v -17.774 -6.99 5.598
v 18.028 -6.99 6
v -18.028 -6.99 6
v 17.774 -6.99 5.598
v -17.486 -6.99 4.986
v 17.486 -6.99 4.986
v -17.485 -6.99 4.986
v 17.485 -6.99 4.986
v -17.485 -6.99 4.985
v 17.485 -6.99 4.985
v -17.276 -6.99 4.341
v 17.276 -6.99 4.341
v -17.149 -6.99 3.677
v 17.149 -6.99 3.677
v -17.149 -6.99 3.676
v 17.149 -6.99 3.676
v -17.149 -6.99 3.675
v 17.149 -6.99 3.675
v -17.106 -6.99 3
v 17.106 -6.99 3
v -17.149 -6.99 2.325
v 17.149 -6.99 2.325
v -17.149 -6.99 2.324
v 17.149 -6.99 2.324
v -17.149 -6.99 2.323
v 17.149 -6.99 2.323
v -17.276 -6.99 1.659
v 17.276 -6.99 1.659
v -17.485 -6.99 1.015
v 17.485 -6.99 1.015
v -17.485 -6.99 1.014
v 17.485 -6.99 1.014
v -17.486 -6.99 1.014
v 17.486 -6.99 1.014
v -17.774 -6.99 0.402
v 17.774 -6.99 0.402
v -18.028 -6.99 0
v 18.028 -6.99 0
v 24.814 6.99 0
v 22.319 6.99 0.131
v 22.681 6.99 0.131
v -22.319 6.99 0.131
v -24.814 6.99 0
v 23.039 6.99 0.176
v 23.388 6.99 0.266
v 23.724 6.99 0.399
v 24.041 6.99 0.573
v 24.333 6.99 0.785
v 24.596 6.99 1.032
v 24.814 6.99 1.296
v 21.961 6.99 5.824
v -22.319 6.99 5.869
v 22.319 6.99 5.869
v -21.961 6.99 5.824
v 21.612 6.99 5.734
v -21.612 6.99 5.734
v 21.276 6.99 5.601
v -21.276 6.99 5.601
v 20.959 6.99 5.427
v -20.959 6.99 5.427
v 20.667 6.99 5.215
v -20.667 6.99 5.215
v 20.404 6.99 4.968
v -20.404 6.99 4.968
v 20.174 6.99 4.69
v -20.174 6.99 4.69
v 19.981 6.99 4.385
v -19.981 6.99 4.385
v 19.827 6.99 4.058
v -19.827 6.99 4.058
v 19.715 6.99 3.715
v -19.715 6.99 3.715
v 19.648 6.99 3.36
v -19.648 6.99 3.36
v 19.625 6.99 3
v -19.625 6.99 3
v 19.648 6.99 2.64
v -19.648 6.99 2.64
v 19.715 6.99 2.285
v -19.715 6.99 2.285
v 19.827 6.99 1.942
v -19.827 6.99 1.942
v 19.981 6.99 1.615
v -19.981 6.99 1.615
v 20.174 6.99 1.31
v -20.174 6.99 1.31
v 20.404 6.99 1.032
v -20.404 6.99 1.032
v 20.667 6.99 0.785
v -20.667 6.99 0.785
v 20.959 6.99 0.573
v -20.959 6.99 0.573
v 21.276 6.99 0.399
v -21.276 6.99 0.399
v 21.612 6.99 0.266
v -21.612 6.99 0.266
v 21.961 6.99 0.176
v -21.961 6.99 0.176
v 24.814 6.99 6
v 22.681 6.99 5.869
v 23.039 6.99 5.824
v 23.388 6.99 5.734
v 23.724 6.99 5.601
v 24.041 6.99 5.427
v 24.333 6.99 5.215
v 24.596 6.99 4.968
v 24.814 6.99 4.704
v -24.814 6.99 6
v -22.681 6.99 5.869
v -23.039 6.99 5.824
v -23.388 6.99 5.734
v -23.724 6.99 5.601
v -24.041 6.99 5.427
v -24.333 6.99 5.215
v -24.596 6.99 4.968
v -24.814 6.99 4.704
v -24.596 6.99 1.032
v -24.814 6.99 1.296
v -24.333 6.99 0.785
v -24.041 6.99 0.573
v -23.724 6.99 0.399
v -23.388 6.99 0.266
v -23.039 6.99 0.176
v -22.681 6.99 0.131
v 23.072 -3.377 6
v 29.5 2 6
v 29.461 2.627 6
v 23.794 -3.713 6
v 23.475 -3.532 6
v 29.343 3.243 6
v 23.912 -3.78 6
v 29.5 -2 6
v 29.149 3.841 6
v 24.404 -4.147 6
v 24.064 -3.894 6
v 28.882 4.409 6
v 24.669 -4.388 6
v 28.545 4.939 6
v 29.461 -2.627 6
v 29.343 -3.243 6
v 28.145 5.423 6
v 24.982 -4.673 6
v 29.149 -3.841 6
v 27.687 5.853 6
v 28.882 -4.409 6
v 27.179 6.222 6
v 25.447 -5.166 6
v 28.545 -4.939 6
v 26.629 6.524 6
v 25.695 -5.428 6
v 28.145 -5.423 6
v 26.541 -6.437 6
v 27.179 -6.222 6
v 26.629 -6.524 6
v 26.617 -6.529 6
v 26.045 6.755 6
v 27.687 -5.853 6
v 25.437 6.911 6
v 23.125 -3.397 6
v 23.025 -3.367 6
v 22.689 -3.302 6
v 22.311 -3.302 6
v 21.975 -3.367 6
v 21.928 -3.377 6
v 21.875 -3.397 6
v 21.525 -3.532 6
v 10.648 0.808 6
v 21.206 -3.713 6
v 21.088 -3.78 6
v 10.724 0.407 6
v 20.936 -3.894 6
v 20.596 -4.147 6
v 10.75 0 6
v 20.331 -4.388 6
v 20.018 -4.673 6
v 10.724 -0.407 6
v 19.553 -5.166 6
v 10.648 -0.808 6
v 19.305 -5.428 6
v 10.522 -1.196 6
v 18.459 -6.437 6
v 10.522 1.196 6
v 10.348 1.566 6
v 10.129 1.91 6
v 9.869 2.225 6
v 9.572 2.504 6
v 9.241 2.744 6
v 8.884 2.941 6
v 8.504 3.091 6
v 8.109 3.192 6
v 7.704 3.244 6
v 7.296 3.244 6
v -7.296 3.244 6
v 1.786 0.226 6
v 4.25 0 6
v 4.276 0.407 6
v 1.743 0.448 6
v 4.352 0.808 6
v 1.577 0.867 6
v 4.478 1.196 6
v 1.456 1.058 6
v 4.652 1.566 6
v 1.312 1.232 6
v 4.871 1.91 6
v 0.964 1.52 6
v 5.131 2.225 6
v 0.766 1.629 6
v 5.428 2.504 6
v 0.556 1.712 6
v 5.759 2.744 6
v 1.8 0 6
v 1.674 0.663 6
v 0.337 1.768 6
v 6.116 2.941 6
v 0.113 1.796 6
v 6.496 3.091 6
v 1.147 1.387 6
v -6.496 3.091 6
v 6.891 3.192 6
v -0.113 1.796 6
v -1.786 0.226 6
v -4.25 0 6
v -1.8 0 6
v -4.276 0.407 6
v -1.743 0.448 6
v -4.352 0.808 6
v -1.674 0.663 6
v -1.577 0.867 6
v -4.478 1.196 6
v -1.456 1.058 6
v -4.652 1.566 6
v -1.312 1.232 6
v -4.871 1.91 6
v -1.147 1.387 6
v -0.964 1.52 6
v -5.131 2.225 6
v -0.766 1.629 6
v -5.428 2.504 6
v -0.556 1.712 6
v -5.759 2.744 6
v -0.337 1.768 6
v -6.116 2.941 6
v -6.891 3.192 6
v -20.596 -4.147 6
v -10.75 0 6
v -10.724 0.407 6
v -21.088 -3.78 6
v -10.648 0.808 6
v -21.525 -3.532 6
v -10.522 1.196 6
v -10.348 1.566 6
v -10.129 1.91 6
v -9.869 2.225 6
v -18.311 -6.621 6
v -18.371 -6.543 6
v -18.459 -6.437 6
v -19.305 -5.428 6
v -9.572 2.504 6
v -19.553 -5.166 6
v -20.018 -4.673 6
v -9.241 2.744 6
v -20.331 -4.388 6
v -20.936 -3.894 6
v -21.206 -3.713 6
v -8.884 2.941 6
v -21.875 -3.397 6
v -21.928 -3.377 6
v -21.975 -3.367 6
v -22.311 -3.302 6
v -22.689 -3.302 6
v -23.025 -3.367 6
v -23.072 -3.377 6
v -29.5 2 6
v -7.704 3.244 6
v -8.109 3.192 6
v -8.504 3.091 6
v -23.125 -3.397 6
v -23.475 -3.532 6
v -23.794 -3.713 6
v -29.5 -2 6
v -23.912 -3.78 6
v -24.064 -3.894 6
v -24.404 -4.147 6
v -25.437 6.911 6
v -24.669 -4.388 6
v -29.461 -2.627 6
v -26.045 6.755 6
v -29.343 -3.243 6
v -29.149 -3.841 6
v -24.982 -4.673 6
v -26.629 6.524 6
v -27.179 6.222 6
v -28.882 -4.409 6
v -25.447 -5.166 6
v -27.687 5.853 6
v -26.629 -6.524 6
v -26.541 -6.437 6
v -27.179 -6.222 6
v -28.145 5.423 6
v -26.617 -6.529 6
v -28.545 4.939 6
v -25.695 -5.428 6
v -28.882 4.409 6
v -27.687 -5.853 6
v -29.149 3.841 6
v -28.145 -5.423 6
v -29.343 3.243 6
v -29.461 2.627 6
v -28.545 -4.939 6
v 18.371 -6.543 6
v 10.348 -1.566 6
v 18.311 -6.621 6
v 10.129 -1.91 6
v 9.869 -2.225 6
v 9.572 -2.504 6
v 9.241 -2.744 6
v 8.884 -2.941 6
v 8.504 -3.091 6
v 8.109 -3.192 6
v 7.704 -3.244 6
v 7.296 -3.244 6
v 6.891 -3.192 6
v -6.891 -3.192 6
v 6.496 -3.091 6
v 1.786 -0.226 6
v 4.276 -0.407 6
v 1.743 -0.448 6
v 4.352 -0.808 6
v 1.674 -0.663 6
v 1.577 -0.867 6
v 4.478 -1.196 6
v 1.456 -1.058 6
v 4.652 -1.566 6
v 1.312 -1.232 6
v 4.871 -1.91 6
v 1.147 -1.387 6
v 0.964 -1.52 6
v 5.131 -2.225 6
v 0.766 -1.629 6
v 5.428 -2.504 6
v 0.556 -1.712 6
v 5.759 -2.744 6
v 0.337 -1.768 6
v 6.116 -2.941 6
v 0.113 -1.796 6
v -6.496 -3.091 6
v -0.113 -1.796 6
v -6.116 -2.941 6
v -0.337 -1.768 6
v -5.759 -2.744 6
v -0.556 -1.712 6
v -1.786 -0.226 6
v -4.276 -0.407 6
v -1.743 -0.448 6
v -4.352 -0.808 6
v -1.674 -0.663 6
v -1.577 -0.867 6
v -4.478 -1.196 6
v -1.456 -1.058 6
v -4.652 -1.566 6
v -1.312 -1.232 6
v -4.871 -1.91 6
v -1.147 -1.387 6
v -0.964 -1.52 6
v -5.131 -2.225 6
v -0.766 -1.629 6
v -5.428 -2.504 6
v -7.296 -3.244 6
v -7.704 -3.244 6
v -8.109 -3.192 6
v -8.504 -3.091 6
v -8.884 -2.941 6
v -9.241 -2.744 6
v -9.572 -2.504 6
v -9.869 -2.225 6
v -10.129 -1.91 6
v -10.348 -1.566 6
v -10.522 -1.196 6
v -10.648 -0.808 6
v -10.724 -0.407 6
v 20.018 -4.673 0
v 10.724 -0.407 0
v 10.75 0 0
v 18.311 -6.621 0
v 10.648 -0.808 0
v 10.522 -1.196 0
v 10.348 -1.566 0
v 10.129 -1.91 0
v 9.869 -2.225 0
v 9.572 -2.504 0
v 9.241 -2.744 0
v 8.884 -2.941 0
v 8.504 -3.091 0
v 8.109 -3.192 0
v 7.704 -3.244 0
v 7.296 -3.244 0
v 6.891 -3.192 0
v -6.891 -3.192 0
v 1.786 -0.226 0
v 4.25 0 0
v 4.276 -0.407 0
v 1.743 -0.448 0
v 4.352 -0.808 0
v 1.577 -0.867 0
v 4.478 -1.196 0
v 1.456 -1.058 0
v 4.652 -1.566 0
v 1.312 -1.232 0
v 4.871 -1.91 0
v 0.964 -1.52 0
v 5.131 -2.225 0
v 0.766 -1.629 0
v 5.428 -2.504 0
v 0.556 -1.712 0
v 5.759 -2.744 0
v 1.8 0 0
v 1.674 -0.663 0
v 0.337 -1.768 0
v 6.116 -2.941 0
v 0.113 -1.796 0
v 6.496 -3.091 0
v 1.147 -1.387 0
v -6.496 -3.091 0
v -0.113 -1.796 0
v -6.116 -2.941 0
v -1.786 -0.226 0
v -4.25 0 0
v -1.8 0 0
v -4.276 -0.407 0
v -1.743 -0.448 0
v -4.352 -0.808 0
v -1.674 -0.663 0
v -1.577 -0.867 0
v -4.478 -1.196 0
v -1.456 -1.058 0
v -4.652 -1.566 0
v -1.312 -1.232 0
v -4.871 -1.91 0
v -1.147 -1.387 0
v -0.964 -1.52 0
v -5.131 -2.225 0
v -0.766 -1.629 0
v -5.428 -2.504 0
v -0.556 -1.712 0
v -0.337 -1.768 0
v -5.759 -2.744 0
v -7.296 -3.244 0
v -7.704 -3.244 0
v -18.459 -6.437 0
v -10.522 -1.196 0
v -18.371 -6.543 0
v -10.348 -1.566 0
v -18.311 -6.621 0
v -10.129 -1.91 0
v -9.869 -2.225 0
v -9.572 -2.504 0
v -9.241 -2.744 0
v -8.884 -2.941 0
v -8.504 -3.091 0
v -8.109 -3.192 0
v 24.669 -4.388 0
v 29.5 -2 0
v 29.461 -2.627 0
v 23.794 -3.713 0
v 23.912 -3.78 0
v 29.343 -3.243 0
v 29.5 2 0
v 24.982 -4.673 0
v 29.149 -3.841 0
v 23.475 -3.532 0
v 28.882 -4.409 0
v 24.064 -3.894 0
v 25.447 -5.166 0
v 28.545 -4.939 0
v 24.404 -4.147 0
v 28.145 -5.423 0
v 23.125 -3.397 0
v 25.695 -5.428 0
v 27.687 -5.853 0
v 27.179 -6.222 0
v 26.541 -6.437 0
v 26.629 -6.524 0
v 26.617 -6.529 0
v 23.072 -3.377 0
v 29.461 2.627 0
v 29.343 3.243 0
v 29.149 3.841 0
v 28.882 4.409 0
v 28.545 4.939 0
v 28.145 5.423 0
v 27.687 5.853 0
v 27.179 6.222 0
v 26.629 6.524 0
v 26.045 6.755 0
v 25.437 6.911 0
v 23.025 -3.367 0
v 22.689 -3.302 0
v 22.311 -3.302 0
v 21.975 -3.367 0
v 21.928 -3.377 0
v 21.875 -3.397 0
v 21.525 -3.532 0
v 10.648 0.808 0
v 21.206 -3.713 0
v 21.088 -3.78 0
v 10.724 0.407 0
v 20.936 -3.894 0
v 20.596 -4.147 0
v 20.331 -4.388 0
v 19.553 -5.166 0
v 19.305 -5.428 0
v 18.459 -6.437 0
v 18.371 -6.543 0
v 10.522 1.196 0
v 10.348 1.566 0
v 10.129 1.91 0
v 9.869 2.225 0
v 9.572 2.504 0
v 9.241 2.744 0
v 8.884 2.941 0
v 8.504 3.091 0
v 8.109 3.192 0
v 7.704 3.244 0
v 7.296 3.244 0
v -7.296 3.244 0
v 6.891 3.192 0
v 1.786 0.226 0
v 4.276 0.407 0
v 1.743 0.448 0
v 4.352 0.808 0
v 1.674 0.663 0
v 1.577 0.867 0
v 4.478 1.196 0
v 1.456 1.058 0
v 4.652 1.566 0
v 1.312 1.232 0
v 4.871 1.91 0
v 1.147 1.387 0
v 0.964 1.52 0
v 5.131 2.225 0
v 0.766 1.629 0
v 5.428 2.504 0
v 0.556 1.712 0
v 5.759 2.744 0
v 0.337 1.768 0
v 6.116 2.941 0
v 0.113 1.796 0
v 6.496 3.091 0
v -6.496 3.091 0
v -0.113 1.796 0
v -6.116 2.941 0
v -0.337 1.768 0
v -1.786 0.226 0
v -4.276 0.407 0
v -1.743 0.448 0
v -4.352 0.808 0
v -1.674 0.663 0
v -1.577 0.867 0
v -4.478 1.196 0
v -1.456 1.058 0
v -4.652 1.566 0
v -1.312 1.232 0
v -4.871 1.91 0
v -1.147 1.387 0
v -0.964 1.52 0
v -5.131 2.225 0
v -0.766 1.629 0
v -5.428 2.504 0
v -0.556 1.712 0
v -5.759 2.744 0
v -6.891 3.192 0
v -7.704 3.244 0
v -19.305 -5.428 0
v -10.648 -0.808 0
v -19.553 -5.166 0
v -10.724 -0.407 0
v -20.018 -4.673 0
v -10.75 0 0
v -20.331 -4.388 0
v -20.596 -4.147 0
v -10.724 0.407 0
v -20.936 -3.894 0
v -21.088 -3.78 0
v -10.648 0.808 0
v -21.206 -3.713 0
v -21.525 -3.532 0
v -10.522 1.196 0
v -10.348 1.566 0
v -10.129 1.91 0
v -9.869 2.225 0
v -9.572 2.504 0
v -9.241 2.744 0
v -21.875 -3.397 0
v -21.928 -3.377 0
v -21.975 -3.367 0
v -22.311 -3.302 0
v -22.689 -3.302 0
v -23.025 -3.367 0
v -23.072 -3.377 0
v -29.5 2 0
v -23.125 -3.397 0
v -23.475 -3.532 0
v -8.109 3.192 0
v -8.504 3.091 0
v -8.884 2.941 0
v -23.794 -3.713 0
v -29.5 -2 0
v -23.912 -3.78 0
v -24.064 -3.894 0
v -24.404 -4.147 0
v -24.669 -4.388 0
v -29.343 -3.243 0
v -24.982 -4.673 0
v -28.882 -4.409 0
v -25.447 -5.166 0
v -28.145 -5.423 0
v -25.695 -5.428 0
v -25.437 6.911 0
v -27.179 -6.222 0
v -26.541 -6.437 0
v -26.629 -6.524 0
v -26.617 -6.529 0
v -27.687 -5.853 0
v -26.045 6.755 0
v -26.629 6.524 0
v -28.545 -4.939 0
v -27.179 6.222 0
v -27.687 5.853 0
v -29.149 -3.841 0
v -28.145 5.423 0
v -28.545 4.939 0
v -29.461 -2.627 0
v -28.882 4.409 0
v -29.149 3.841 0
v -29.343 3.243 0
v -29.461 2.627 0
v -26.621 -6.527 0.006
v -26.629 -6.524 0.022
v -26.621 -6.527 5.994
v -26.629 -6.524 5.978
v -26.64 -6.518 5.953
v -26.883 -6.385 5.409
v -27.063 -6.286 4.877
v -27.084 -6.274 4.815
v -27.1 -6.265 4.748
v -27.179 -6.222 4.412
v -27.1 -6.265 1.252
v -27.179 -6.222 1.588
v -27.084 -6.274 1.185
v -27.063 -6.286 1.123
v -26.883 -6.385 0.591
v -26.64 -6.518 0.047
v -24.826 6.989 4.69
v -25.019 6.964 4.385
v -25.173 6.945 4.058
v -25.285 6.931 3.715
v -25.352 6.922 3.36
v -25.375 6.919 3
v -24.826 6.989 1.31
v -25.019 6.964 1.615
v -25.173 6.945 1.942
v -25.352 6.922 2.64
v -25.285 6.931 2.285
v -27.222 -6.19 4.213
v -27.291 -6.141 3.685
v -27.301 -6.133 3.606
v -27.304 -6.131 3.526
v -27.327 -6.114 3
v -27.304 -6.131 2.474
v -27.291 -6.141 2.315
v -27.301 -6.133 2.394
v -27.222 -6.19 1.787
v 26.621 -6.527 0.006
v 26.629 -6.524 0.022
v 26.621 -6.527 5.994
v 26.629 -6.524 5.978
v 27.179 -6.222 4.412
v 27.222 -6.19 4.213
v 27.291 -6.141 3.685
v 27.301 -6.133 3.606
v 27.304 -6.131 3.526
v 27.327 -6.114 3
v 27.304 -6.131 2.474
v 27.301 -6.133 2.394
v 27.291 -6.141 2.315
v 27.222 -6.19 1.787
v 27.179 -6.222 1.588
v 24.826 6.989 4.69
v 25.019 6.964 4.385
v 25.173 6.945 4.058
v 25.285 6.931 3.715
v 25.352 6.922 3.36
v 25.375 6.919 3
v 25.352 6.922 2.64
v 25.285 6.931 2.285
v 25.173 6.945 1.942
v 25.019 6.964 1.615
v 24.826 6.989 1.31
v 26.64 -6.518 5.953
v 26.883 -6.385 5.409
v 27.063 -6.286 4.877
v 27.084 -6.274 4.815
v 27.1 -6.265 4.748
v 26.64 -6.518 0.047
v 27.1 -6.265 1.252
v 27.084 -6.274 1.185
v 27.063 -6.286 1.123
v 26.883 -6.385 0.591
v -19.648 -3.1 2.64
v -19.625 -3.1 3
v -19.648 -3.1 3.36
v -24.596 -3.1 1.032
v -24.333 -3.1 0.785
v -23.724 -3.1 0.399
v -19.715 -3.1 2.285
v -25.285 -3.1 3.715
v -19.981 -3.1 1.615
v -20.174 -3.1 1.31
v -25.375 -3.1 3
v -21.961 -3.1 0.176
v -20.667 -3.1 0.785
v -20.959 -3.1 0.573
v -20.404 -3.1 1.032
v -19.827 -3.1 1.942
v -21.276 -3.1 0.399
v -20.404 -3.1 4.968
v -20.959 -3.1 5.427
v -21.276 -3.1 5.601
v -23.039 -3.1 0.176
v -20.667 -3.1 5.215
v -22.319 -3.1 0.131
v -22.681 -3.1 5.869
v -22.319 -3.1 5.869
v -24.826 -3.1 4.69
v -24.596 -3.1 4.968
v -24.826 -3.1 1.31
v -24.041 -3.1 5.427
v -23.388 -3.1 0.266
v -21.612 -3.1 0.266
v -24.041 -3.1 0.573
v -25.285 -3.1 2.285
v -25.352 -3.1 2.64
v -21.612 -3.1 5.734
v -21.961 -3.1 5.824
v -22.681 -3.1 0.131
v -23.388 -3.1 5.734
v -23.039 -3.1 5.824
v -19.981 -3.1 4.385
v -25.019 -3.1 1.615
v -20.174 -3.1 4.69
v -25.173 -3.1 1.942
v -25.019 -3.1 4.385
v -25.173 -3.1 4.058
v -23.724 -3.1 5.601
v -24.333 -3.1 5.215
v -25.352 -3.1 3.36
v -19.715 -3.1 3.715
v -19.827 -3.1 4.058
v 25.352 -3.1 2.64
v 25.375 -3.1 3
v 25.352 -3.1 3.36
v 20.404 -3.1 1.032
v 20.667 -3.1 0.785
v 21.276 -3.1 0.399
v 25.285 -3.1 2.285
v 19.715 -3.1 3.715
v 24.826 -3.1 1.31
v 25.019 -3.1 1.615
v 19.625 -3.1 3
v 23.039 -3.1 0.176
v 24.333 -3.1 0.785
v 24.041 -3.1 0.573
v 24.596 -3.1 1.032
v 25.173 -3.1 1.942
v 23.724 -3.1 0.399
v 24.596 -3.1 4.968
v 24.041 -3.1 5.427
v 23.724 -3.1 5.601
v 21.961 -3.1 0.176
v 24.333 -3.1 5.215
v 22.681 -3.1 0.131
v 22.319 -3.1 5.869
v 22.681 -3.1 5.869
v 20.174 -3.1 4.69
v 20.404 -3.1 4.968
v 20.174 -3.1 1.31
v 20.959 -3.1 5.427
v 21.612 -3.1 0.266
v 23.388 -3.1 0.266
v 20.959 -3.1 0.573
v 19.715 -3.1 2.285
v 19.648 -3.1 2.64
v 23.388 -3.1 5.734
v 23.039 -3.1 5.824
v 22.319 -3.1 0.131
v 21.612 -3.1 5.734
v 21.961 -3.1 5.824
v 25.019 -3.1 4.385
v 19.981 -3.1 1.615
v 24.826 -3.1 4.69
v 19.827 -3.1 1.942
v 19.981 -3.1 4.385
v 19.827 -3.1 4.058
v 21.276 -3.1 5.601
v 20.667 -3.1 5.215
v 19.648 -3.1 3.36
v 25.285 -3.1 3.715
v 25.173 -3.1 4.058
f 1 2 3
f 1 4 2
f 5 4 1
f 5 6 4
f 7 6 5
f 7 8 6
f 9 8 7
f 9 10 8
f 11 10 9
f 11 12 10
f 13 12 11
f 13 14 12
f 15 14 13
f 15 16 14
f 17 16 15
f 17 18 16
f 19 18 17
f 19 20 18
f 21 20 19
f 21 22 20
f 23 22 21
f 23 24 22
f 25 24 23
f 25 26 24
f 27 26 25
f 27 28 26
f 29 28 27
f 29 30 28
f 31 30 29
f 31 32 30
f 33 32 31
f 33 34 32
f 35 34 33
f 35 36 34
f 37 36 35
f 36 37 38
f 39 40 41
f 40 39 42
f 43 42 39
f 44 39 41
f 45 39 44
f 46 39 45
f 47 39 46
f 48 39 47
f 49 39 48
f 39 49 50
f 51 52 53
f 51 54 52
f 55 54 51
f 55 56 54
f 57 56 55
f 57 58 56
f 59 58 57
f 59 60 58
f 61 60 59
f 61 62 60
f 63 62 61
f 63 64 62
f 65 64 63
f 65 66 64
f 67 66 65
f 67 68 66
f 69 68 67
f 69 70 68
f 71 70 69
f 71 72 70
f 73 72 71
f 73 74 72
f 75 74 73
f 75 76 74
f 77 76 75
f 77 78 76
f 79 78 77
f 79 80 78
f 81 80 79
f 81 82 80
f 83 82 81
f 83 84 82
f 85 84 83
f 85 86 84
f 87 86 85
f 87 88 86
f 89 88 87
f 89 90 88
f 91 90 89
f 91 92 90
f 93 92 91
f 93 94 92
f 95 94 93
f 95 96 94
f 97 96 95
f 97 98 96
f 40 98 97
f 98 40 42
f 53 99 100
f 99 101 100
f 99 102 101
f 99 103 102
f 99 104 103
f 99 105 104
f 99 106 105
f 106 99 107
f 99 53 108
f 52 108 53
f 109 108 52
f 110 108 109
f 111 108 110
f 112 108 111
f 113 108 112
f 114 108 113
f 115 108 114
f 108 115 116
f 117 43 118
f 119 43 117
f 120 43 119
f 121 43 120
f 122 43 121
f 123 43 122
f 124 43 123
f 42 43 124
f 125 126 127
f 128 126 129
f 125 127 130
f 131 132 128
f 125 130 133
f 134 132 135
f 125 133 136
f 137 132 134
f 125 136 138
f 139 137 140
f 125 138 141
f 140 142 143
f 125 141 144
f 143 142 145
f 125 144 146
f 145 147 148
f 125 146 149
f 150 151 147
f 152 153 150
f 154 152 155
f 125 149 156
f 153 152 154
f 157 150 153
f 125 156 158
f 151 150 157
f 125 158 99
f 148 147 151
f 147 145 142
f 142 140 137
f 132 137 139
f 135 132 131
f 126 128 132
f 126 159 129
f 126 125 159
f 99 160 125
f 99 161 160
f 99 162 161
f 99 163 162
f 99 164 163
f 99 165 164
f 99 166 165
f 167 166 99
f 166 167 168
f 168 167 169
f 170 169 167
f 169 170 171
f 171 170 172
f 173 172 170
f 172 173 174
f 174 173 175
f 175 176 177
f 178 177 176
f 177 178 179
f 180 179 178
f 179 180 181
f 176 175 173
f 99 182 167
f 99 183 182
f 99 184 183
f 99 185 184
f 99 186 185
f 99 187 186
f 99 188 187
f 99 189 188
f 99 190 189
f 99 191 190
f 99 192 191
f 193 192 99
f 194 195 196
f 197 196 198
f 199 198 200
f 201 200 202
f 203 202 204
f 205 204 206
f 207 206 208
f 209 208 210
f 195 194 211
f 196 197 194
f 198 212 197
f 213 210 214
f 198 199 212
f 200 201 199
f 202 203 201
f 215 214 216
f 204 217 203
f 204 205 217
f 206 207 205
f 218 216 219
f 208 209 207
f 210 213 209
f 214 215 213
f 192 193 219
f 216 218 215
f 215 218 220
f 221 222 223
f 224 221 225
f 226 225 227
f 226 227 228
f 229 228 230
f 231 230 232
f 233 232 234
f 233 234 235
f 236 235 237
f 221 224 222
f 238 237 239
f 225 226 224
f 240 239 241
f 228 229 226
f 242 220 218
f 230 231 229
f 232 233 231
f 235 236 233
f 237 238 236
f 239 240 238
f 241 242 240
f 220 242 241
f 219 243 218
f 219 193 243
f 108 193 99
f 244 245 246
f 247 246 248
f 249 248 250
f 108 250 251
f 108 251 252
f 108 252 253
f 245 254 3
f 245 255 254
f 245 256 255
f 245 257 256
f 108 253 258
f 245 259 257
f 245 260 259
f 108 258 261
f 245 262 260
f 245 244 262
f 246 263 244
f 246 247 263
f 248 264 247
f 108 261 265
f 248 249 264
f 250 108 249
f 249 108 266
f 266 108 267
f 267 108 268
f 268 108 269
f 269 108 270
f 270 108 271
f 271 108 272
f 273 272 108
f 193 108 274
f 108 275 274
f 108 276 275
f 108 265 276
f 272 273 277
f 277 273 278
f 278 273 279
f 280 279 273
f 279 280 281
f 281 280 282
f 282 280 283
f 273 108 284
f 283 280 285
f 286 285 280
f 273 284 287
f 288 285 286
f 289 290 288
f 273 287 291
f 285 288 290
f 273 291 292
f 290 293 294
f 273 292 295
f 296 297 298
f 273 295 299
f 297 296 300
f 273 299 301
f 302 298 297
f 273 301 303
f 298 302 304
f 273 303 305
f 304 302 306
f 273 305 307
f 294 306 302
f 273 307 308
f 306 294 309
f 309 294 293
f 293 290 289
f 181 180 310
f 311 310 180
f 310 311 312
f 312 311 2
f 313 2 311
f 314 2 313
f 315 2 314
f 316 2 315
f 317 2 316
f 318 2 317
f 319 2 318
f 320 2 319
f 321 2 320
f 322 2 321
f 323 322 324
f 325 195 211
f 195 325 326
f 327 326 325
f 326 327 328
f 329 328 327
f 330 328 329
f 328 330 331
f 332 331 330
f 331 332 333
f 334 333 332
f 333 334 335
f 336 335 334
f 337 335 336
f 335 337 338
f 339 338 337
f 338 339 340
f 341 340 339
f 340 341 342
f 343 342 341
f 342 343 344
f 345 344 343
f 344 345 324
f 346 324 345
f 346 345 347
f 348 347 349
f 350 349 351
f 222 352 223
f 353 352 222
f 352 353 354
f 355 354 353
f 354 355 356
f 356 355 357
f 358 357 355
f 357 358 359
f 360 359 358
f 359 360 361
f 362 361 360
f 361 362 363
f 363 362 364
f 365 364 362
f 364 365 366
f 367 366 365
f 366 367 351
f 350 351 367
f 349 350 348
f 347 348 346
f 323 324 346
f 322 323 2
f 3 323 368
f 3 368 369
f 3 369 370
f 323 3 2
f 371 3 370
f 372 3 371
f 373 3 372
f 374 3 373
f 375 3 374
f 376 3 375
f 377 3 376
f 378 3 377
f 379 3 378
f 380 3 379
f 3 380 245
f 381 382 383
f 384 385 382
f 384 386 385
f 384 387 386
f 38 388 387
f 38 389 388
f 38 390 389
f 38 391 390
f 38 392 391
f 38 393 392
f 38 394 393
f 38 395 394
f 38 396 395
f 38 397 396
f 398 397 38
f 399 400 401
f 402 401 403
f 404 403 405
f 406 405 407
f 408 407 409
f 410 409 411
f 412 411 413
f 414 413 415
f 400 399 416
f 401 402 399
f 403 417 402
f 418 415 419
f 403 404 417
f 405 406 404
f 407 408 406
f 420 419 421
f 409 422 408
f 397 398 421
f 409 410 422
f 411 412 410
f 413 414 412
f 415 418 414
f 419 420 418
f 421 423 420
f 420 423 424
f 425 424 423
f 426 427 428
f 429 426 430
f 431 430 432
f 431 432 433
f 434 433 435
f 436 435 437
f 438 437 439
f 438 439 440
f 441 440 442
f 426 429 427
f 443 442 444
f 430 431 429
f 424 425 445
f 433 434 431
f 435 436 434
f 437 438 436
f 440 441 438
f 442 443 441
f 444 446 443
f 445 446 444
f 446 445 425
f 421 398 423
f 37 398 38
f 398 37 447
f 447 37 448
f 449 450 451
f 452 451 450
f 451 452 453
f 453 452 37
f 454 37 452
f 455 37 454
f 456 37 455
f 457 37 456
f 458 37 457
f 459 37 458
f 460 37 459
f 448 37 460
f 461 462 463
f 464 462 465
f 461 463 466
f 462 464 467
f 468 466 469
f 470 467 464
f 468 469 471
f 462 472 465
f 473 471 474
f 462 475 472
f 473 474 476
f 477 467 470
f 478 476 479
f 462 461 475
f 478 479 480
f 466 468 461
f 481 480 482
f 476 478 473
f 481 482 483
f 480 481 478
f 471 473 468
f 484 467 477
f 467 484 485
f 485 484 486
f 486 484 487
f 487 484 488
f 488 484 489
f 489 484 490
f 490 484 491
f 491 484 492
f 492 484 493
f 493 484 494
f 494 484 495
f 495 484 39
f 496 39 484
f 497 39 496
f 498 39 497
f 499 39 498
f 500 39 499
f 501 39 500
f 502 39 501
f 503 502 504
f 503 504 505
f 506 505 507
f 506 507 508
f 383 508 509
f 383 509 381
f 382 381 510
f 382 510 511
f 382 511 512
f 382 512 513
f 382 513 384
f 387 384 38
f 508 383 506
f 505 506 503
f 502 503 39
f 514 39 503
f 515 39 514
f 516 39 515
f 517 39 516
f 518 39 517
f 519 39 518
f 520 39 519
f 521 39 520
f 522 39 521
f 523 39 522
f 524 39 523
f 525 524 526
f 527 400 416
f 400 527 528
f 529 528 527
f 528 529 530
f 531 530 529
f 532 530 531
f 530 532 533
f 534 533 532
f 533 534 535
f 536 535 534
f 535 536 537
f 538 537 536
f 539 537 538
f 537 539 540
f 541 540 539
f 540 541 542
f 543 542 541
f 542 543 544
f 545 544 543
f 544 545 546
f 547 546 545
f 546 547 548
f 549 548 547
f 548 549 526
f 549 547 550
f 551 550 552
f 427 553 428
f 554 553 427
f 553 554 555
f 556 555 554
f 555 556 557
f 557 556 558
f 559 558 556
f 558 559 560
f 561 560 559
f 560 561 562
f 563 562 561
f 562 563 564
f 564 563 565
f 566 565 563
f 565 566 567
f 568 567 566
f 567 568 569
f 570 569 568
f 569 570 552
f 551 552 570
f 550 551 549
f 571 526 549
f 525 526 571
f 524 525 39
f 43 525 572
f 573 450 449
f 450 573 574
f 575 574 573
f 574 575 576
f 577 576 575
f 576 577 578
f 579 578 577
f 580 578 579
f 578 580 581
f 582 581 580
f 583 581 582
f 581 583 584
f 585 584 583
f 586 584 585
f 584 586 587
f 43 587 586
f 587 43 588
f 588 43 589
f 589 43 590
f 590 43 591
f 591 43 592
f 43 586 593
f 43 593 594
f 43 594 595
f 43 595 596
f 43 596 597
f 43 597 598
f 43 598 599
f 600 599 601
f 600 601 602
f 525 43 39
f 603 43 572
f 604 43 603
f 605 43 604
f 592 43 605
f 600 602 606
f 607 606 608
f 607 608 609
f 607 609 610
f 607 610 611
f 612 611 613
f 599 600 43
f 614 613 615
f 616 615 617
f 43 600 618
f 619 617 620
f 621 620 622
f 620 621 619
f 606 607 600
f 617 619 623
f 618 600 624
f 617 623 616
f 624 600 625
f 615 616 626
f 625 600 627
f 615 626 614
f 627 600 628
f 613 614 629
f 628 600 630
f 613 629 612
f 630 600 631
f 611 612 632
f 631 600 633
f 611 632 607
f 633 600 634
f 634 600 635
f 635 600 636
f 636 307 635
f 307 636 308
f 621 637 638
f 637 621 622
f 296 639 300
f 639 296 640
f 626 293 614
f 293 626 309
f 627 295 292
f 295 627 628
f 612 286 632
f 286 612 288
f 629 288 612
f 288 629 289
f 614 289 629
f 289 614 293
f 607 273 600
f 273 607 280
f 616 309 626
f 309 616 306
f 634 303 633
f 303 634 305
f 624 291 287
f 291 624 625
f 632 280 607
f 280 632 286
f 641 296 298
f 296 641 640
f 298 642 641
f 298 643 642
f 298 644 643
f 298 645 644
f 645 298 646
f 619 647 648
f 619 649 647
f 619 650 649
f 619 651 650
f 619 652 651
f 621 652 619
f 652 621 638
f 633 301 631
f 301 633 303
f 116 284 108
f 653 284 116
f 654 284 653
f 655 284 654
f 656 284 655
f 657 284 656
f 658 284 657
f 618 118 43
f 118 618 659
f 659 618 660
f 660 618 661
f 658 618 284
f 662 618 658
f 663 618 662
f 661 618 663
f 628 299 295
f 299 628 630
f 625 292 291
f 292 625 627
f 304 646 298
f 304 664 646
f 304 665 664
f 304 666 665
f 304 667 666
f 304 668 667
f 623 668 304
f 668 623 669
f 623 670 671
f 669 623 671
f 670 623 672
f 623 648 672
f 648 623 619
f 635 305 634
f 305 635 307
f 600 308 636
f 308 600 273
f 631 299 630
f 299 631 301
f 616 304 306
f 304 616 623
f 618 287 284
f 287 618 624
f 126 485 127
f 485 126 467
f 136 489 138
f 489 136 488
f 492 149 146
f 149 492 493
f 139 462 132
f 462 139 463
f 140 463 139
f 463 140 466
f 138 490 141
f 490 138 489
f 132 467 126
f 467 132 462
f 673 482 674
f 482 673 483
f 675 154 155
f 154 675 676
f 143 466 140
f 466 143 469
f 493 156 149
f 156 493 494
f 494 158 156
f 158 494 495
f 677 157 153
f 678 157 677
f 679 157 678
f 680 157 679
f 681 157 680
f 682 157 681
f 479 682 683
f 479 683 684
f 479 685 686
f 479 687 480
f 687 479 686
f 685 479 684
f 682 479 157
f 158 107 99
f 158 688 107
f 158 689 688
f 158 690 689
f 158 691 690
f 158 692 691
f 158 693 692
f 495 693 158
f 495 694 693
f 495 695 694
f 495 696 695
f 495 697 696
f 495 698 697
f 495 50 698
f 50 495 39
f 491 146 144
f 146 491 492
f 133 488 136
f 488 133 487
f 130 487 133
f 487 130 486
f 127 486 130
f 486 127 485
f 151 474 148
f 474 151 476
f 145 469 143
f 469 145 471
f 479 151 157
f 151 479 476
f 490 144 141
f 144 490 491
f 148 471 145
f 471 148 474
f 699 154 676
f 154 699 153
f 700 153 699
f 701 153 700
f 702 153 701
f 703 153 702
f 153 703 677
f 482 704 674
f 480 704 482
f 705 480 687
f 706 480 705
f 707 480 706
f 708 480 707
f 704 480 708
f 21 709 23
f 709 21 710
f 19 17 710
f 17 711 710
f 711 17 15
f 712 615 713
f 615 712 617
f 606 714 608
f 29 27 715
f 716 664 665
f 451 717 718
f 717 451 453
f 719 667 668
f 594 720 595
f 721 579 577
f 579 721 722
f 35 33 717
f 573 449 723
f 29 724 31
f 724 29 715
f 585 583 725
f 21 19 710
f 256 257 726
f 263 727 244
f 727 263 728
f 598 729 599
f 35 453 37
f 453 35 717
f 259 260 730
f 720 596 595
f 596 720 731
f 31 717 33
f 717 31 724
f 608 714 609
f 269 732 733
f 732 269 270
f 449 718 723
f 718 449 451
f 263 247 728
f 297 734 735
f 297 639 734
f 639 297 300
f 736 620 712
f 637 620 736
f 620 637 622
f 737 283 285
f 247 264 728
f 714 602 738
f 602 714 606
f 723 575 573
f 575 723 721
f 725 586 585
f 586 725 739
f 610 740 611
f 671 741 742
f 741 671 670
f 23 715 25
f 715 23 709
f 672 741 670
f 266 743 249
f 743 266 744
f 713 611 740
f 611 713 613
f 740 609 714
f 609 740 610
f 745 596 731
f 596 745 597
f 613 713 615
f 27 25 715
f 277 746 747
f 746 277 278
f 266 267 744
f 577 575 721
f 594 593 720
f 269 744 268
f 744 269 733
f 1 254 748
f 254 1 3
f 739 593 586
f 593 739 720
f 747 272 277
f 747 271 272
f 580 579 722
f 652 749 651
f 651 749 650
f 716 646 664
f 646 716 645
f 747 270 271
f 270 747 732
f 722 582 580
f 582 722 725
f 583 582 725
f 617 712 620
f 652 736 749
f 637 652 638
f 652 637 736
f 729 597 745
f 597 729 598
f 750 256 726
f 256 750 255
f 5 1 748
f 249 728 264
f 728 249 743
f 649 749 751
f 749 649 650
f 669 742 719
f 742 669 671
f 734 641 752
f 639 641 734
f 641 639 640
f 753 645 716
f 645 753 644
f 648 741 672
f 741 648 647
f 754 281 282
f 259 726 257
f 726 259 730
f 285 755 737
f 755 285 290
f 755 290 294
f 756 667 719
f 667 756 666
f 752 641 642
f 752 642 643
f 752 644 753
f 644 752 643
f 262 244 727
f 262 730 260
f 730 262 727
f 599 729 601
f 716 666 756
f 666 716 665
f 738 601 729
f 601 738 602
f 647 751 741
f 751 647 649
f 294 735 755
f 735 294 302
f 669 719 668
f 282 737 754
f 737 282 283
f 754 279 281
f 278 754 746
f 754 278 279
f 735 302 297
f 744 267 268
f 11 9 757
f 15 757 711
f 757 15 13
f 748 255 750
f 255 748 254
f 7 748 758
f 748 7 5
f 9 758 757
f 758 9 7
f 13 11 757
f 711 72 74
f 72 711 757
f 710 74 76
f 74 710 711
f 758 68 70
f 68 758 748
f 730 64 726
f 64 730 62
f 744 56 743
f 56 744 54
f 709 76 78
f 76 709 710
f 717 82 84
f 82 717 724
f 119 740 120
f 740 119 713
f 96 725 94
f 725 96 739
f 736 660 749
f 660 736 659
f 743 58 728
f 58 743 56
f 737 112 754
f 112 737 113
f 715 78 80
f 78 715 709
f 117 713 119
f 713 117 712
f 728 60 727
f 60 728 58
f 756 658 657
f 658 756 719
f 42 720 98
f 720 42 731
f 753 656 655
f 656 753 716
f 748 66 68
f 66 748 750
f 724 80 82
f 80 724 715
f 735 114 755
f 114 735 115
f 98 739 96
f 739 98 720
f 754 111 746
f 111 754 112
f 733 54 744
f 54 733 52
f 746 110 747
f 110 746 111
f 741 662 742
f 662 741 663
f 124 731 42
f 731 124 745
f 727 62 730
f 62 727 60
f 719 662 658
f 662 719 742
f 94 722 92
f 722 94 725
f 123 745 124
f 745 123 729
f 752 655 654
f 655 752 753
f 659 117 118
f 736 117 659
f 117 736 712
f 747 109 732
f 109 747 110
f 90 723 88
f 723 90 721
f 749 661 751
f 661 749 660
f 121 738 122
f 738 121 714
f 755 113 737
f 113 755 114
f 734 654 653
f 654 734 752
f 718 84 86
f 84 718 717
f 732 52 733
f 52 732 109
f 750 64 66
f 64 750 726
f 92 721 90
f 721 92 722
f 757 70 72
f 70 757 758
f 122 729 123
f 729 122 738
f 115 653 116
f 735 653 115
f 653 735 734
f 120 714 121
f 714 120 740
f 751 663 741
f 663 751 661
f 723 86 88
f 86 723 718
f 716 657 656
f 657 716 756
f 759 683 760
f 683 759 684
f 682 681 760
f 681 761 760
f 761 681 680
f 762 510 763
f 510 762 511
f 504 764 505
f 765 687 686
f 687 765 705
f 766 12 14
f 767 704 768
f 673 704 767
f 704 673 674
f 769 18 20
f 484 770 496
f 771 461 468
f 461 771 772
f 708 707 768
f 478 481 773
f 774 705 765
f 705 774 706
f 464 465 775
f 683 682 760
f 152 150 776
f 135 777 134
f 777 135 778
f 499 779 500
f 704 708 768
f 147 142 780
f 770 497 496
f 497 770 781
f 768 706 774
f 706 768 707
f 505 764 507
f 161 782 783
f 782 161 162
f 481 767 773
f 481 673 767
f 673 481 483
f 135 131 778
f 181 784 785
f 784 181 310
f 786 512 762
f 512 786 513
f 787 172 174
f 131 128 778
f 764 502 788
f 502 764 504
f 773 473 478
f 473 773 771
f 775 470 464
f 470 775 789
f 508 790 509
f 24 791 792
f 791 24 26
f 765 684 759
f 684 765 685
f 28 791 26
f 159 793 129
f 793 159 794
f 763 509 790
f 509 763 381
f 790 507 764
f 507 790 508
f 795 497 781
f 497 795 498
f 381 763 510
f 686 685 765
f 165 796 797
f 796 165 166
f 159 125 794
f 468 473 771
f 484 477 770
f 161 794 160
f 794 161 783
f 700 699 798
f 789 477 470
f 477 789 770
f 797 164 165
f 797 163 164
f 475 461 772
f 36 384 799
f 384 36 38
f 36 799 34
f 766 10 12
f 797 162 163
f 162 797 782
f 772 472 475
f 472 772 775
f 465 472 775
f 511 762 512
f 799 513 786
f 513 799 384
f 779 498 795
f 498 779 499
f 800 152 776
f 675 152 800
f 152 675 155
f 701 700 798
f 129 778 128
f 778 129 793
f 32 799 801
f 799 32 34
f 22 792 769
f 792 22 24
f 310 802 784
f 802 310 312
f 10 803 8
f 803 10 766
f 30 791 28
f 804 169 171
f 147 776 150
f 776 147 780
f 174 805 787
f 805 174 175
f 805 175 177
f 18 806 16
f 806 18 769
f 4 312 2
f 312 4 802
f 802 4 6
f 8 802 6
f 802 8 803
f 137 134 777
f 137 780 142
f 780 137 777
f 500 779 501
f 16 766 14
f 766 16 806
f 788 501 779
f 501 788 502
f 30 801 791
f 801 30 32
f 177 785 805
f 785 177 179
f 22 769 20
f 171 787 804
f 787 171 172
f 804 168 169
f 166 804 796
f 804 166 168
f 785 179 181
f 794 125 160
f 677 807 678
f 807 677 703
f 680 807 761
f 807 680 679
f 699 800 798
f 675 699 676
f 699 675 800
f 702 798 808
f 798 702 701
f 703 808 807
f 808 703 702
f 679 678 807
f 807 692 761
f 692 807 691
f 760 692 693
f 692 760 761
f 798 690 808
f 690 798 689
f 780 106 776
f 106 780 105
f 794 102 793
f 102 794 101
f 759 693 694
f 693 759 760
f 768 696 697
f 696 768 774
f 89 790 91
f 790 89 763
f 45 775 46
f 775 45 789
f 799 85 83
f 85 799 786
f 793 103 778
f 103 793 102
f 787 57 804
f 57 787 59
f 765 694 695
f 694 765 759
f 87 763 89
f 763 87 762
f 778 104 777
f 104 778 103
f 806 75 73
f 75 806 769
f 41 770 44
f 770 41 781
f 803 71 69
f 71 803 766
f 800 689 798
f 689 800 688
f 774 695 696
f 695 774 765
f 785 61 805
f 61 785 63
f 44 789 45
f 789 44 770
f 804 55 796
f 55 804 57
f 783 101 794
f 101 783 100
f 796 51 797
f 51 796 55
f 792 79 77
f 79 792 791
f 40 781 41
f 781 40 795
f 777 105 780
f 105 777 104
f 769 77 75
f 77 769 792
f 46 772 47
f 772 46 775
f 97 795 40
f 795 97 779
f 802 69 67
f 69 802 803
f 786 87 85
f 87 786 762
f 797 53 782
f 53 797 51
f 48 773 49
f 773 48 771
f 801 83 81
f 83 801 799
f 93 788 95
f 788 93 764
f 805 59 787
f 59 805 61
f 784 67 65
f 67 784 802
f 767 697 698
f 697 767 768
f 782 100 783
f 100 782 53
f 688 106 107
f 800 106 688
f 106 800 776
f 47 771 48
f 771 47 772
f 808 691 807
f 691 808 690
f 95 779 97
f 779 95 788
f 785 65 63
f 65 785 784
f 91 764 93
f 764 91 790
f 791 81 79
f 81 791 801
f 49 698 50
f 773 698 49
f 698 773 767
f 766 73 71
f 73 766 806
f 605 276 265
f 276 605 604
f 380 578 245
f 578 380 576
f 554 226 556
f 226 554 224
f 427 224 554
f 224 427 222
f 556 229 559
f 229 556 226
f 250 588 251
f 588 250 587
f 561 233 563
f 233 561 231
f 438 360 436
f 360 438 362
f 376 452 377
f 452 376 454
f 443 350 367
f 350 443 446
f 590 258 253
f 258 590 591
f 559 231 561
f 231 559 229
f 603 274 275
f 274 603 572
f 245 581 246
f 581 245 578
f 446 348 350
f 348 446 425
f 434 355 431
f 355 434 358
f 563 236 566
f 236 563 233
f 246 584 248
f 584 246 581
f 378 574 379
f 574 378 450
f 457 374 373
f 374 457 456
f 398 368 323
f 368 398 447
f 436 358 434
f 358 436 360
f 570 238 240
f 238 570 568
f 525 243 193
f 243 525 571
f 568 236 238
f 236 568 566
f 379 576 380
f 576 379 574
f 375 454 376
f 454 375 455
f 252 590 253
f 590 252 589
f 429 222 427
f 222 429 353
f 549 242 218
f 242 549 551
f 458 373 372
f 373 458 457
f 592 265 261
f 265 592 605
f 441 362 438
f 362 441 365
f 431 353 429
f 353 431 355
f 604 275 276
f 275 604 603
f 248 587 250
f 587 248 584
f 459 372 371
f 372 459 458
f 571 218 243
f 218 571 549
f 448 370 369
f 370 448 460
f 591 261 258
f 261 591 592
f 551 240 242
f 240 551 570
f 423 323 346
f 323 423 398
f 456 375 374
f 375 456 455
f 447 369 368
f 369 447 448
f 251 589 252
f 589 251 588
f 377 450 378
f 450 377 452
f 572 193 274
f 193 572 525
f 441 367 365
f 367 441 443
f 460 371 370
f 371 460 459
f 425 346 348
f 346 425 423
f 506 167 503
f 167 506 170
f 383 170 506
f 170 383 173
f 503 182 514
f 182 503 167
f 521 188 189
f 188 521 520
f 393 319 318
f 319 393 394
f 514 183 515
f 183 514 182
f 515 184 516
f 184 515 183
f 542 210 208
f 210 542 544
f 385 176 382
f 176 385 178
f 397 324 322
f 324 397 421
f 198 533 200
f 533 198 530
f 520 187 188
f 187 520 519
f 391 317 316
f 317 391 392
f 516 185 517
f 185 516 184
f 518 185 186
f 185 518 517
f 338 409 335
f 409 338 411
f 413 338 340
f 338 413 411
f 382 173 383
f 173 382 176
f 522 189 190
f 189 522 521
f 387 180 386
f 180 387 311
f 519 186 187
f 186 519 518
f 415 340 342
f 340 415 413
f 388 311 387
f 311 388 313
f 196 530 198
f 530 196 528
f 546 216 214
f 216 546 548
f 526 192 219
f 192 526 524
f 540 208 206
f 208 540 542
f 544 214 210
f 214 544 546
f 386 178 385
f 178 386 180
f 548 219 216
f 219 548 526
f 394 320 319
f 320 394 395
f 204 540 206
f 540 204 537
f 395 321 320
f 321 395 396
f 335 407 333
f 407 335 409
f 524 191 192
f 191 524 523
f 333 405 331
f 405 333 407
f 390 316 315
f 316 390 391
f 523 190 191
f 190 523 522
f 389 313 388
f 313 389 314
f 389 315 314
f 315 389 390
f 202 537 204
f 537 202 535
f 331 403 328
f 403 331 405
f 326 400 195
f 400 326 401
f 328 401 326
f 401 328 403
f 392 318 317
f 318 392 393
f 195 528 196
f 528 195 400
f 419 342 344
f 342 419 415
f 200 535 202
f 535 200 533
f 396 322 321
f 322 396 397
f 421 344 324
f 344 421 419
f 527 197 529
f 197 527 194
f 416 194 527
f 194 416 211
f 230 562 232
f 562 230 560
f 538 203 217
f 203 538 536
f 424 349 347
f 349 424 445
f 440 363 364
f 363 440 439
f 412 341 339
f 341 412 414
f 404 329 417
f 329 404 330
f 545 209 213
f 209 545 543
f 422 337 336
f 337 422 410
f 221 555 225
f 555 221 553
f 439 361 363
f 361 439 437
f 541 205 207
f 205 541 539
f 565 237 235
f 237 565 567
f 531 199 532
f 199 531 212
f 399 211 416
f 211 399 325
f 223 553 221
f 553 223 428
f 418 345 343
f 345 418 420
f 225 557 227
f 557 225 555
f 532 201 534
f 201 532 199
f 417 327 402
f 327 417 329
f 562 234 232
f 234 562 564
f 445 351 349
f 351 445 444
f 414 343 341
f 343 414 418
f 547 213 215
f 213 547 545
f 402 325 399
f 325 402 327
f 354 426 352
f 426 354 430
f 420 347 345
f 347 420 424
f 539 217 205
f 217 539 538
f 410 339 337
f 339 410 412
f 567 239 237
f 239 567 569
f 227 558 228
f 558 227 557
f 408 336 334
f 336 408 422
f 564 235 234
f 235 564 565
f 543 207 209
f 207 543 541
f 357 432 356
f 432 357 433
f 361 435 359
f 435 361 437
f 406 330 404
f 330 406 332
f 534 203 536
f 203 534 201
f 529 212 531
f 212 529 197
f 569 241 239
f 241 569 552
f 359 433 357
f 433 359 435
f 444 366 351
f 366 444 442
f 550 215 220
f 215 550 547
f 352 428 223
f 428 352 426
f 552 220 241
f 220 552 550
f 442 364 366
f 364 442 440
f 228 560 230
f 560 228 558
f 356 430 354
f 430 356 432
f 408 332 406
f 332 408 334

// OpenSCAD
$fn = 50;


difference() {
	union() {
		hull() {
			translate(v = [-9.5000000000, 2.0000000000, 0]) {
				cylinder(h = 6, r = 5);
			}
			translate(v = [9.5000000000, 2.0000000000, 0]) {
				cylinder(h = 6, r = 5);
			}
			translate(v = [-9.5000000000, -2.0000000000, 0]) {
				cylinder(h = 6, r = 5);
			}
			translate(v = [9.5000000000, -2.0000000000, 0]) {
				cylinder(h = 6, r = 5);
			}
		}
		translate(v = [-15.0000000000, 0.0000000000, 0]) {
			hull() {
				translate(v = [-9.5000000000, 2.0000000000, 0]) {
					cylinder(h = 6, r = 5);
				}
				translate(v = [9.5000000000, 2.0000000000, 0]) {
					cylinder(h = 6, r = 5);
				}
				translate(v = [-9.5000000000, -2.0000000000, 0]) {
					cylinder(h = 6, r = 5);
				}
				translate(v = [9.5000000000, -2.0000000000, 0]) {
					cylinder(h = 6, r = 5);
				}
			}
		}
		translate(v = [-15.0000000000, 0.0000000000, 0]) {
			hull() {
				translate(v = [-9.5000000000, 2.0000000000, 0]) {
					cylinder(h = 6, r = 5);
				}
				translate(v = [9.5000000000, 2.0000000000, 0]) {
					cylinder(h = 6, r = 5);
				}
				translate(v = [-9.5000000000, -2.0000000000, 0]) {
					cylinder(h = 6, r = 5);
				}
				translate(v = [9.5000000000, -2.0000000000, 0]) {
					cylinder(h = 6, r = 5);
				}
			}
		}
		translate(v = [15.0000000000, 0.0000000000, 0]) {
			hull() {
				translate(v = [-9.5000000000, 2.0000000000, 0]) {
					cylinder(h = 6, r = 5);
				}
				translate(v = [9.5000000000, 2.0000000000, 0]) {
					cylinder(h = 6, r = 5);
				}
				translate(v = [-9.5000000000, -2.0000000000, 0]) {
					cylinder(h = 6, r = 5);
				}
				translate(v = [9.5000000000, -2.0000000000, 0]) {
					cylinder(h = 6, r = 5);
				}
			}
		}
		translate(v = [15.0000000000, 0.0000000000, 0]) {
			hull() {
				translate(v = [-9.5000000000, 2.0000000000, 0]) {
					cylinder(h = 6, r = 5);
				}
				translate(v = [9.5000000000, 2.0000000000, 0]) {
					cylinder(h = 6, r = 5);
				}
				translate(v = [-9.5000000000, -2.0000000000, 0]) {
					cylinder(h = 6, r = 5);
				}
				translate(v = [9.5000000000, -2.0000000000, 0]) {
					cylinder(h = 6, r = 5);
				}
			}
		}
	}
	union() {
		translate(v = [-22.5000000000, -7.0000000000, 3.0000000000]) {
			rotate(a = [90, 0, 0]) {
				difference() {
					union() {
						#translate(v = [0, 0, -14.0000000000]) {
							cylinder(h = 14, r = 2.6000000000);
						}
						#translate(v = [0, 0, -3.9000000000]) {
							cylinder(h = 3.9000000000, r1 = 2.8750000000, r2 = 5.4000000000);
						}
						#translate(v = [0, 0, -14.0000000000]) {
							cylinder(h = 14, r = 2.8750000000);
						}
						#translate(v = [0, 0, -14.0000000000]) {
							cylinder(h = 14, r = 2.6000000000);
						}
					}
					union();
				}
			}
		}
		translate(v = [22.5000000000, -7.0000000000, 3.0000000000]) {
			rotate(a = [90, 0, 0]) {
				difference() {
					union() {
						#translate(v = [0, 0, -14.0000000000]) {
							cylinder(h = 14, r = 2.6000000000);
						}
						#translate(v = [0, 0, -3.9000000000]) {
							cylinder(h = 3.9000000000, r1 = 2.8750000000, r2 = 5.4000000000);
						}
						#translate(v = [0, 0, -14.0000000000]) {
							cylinder(h = 14, r = 2.8750000000);
						}
						#translate(v = [0, 0, -14.0000000000]) {
							cylinder(h = 14, r = 2.6000000000);
						}
					}
					union();
				}
			}
		}
		translate(v = [-7.5000000000, 0.0000000000, 0]) {
			translate(v = [0, 0, -100]) {
				cylinder(h = 200, r = 3.2500000000);
			}
		}
		translate(v = [7.5000000000, 0.0000000000, 0]) {
			translate(v = [0, 0, -100]) {
				cylinder(h = 200, r = 3.2500000000);
			}
		}
		translate(v = [-7.5000000000, 0.0000000000, 0]) {
			translate(v = [0, 0, -100]) {
				cylinder(h = 200, r = 1.8000000000);
			}
		}
		translate(v = [0, 0, -100]) {
			cylinder(h = 200, r = 1.8000000000);
		}
		translate(v = [7.5000000000, 0.0000000000, 0]) {
			translate(v = [0, 0, -100]) {
				cylinder(h = 200, r = 1.8000000000);
			}
		}
	}
}
